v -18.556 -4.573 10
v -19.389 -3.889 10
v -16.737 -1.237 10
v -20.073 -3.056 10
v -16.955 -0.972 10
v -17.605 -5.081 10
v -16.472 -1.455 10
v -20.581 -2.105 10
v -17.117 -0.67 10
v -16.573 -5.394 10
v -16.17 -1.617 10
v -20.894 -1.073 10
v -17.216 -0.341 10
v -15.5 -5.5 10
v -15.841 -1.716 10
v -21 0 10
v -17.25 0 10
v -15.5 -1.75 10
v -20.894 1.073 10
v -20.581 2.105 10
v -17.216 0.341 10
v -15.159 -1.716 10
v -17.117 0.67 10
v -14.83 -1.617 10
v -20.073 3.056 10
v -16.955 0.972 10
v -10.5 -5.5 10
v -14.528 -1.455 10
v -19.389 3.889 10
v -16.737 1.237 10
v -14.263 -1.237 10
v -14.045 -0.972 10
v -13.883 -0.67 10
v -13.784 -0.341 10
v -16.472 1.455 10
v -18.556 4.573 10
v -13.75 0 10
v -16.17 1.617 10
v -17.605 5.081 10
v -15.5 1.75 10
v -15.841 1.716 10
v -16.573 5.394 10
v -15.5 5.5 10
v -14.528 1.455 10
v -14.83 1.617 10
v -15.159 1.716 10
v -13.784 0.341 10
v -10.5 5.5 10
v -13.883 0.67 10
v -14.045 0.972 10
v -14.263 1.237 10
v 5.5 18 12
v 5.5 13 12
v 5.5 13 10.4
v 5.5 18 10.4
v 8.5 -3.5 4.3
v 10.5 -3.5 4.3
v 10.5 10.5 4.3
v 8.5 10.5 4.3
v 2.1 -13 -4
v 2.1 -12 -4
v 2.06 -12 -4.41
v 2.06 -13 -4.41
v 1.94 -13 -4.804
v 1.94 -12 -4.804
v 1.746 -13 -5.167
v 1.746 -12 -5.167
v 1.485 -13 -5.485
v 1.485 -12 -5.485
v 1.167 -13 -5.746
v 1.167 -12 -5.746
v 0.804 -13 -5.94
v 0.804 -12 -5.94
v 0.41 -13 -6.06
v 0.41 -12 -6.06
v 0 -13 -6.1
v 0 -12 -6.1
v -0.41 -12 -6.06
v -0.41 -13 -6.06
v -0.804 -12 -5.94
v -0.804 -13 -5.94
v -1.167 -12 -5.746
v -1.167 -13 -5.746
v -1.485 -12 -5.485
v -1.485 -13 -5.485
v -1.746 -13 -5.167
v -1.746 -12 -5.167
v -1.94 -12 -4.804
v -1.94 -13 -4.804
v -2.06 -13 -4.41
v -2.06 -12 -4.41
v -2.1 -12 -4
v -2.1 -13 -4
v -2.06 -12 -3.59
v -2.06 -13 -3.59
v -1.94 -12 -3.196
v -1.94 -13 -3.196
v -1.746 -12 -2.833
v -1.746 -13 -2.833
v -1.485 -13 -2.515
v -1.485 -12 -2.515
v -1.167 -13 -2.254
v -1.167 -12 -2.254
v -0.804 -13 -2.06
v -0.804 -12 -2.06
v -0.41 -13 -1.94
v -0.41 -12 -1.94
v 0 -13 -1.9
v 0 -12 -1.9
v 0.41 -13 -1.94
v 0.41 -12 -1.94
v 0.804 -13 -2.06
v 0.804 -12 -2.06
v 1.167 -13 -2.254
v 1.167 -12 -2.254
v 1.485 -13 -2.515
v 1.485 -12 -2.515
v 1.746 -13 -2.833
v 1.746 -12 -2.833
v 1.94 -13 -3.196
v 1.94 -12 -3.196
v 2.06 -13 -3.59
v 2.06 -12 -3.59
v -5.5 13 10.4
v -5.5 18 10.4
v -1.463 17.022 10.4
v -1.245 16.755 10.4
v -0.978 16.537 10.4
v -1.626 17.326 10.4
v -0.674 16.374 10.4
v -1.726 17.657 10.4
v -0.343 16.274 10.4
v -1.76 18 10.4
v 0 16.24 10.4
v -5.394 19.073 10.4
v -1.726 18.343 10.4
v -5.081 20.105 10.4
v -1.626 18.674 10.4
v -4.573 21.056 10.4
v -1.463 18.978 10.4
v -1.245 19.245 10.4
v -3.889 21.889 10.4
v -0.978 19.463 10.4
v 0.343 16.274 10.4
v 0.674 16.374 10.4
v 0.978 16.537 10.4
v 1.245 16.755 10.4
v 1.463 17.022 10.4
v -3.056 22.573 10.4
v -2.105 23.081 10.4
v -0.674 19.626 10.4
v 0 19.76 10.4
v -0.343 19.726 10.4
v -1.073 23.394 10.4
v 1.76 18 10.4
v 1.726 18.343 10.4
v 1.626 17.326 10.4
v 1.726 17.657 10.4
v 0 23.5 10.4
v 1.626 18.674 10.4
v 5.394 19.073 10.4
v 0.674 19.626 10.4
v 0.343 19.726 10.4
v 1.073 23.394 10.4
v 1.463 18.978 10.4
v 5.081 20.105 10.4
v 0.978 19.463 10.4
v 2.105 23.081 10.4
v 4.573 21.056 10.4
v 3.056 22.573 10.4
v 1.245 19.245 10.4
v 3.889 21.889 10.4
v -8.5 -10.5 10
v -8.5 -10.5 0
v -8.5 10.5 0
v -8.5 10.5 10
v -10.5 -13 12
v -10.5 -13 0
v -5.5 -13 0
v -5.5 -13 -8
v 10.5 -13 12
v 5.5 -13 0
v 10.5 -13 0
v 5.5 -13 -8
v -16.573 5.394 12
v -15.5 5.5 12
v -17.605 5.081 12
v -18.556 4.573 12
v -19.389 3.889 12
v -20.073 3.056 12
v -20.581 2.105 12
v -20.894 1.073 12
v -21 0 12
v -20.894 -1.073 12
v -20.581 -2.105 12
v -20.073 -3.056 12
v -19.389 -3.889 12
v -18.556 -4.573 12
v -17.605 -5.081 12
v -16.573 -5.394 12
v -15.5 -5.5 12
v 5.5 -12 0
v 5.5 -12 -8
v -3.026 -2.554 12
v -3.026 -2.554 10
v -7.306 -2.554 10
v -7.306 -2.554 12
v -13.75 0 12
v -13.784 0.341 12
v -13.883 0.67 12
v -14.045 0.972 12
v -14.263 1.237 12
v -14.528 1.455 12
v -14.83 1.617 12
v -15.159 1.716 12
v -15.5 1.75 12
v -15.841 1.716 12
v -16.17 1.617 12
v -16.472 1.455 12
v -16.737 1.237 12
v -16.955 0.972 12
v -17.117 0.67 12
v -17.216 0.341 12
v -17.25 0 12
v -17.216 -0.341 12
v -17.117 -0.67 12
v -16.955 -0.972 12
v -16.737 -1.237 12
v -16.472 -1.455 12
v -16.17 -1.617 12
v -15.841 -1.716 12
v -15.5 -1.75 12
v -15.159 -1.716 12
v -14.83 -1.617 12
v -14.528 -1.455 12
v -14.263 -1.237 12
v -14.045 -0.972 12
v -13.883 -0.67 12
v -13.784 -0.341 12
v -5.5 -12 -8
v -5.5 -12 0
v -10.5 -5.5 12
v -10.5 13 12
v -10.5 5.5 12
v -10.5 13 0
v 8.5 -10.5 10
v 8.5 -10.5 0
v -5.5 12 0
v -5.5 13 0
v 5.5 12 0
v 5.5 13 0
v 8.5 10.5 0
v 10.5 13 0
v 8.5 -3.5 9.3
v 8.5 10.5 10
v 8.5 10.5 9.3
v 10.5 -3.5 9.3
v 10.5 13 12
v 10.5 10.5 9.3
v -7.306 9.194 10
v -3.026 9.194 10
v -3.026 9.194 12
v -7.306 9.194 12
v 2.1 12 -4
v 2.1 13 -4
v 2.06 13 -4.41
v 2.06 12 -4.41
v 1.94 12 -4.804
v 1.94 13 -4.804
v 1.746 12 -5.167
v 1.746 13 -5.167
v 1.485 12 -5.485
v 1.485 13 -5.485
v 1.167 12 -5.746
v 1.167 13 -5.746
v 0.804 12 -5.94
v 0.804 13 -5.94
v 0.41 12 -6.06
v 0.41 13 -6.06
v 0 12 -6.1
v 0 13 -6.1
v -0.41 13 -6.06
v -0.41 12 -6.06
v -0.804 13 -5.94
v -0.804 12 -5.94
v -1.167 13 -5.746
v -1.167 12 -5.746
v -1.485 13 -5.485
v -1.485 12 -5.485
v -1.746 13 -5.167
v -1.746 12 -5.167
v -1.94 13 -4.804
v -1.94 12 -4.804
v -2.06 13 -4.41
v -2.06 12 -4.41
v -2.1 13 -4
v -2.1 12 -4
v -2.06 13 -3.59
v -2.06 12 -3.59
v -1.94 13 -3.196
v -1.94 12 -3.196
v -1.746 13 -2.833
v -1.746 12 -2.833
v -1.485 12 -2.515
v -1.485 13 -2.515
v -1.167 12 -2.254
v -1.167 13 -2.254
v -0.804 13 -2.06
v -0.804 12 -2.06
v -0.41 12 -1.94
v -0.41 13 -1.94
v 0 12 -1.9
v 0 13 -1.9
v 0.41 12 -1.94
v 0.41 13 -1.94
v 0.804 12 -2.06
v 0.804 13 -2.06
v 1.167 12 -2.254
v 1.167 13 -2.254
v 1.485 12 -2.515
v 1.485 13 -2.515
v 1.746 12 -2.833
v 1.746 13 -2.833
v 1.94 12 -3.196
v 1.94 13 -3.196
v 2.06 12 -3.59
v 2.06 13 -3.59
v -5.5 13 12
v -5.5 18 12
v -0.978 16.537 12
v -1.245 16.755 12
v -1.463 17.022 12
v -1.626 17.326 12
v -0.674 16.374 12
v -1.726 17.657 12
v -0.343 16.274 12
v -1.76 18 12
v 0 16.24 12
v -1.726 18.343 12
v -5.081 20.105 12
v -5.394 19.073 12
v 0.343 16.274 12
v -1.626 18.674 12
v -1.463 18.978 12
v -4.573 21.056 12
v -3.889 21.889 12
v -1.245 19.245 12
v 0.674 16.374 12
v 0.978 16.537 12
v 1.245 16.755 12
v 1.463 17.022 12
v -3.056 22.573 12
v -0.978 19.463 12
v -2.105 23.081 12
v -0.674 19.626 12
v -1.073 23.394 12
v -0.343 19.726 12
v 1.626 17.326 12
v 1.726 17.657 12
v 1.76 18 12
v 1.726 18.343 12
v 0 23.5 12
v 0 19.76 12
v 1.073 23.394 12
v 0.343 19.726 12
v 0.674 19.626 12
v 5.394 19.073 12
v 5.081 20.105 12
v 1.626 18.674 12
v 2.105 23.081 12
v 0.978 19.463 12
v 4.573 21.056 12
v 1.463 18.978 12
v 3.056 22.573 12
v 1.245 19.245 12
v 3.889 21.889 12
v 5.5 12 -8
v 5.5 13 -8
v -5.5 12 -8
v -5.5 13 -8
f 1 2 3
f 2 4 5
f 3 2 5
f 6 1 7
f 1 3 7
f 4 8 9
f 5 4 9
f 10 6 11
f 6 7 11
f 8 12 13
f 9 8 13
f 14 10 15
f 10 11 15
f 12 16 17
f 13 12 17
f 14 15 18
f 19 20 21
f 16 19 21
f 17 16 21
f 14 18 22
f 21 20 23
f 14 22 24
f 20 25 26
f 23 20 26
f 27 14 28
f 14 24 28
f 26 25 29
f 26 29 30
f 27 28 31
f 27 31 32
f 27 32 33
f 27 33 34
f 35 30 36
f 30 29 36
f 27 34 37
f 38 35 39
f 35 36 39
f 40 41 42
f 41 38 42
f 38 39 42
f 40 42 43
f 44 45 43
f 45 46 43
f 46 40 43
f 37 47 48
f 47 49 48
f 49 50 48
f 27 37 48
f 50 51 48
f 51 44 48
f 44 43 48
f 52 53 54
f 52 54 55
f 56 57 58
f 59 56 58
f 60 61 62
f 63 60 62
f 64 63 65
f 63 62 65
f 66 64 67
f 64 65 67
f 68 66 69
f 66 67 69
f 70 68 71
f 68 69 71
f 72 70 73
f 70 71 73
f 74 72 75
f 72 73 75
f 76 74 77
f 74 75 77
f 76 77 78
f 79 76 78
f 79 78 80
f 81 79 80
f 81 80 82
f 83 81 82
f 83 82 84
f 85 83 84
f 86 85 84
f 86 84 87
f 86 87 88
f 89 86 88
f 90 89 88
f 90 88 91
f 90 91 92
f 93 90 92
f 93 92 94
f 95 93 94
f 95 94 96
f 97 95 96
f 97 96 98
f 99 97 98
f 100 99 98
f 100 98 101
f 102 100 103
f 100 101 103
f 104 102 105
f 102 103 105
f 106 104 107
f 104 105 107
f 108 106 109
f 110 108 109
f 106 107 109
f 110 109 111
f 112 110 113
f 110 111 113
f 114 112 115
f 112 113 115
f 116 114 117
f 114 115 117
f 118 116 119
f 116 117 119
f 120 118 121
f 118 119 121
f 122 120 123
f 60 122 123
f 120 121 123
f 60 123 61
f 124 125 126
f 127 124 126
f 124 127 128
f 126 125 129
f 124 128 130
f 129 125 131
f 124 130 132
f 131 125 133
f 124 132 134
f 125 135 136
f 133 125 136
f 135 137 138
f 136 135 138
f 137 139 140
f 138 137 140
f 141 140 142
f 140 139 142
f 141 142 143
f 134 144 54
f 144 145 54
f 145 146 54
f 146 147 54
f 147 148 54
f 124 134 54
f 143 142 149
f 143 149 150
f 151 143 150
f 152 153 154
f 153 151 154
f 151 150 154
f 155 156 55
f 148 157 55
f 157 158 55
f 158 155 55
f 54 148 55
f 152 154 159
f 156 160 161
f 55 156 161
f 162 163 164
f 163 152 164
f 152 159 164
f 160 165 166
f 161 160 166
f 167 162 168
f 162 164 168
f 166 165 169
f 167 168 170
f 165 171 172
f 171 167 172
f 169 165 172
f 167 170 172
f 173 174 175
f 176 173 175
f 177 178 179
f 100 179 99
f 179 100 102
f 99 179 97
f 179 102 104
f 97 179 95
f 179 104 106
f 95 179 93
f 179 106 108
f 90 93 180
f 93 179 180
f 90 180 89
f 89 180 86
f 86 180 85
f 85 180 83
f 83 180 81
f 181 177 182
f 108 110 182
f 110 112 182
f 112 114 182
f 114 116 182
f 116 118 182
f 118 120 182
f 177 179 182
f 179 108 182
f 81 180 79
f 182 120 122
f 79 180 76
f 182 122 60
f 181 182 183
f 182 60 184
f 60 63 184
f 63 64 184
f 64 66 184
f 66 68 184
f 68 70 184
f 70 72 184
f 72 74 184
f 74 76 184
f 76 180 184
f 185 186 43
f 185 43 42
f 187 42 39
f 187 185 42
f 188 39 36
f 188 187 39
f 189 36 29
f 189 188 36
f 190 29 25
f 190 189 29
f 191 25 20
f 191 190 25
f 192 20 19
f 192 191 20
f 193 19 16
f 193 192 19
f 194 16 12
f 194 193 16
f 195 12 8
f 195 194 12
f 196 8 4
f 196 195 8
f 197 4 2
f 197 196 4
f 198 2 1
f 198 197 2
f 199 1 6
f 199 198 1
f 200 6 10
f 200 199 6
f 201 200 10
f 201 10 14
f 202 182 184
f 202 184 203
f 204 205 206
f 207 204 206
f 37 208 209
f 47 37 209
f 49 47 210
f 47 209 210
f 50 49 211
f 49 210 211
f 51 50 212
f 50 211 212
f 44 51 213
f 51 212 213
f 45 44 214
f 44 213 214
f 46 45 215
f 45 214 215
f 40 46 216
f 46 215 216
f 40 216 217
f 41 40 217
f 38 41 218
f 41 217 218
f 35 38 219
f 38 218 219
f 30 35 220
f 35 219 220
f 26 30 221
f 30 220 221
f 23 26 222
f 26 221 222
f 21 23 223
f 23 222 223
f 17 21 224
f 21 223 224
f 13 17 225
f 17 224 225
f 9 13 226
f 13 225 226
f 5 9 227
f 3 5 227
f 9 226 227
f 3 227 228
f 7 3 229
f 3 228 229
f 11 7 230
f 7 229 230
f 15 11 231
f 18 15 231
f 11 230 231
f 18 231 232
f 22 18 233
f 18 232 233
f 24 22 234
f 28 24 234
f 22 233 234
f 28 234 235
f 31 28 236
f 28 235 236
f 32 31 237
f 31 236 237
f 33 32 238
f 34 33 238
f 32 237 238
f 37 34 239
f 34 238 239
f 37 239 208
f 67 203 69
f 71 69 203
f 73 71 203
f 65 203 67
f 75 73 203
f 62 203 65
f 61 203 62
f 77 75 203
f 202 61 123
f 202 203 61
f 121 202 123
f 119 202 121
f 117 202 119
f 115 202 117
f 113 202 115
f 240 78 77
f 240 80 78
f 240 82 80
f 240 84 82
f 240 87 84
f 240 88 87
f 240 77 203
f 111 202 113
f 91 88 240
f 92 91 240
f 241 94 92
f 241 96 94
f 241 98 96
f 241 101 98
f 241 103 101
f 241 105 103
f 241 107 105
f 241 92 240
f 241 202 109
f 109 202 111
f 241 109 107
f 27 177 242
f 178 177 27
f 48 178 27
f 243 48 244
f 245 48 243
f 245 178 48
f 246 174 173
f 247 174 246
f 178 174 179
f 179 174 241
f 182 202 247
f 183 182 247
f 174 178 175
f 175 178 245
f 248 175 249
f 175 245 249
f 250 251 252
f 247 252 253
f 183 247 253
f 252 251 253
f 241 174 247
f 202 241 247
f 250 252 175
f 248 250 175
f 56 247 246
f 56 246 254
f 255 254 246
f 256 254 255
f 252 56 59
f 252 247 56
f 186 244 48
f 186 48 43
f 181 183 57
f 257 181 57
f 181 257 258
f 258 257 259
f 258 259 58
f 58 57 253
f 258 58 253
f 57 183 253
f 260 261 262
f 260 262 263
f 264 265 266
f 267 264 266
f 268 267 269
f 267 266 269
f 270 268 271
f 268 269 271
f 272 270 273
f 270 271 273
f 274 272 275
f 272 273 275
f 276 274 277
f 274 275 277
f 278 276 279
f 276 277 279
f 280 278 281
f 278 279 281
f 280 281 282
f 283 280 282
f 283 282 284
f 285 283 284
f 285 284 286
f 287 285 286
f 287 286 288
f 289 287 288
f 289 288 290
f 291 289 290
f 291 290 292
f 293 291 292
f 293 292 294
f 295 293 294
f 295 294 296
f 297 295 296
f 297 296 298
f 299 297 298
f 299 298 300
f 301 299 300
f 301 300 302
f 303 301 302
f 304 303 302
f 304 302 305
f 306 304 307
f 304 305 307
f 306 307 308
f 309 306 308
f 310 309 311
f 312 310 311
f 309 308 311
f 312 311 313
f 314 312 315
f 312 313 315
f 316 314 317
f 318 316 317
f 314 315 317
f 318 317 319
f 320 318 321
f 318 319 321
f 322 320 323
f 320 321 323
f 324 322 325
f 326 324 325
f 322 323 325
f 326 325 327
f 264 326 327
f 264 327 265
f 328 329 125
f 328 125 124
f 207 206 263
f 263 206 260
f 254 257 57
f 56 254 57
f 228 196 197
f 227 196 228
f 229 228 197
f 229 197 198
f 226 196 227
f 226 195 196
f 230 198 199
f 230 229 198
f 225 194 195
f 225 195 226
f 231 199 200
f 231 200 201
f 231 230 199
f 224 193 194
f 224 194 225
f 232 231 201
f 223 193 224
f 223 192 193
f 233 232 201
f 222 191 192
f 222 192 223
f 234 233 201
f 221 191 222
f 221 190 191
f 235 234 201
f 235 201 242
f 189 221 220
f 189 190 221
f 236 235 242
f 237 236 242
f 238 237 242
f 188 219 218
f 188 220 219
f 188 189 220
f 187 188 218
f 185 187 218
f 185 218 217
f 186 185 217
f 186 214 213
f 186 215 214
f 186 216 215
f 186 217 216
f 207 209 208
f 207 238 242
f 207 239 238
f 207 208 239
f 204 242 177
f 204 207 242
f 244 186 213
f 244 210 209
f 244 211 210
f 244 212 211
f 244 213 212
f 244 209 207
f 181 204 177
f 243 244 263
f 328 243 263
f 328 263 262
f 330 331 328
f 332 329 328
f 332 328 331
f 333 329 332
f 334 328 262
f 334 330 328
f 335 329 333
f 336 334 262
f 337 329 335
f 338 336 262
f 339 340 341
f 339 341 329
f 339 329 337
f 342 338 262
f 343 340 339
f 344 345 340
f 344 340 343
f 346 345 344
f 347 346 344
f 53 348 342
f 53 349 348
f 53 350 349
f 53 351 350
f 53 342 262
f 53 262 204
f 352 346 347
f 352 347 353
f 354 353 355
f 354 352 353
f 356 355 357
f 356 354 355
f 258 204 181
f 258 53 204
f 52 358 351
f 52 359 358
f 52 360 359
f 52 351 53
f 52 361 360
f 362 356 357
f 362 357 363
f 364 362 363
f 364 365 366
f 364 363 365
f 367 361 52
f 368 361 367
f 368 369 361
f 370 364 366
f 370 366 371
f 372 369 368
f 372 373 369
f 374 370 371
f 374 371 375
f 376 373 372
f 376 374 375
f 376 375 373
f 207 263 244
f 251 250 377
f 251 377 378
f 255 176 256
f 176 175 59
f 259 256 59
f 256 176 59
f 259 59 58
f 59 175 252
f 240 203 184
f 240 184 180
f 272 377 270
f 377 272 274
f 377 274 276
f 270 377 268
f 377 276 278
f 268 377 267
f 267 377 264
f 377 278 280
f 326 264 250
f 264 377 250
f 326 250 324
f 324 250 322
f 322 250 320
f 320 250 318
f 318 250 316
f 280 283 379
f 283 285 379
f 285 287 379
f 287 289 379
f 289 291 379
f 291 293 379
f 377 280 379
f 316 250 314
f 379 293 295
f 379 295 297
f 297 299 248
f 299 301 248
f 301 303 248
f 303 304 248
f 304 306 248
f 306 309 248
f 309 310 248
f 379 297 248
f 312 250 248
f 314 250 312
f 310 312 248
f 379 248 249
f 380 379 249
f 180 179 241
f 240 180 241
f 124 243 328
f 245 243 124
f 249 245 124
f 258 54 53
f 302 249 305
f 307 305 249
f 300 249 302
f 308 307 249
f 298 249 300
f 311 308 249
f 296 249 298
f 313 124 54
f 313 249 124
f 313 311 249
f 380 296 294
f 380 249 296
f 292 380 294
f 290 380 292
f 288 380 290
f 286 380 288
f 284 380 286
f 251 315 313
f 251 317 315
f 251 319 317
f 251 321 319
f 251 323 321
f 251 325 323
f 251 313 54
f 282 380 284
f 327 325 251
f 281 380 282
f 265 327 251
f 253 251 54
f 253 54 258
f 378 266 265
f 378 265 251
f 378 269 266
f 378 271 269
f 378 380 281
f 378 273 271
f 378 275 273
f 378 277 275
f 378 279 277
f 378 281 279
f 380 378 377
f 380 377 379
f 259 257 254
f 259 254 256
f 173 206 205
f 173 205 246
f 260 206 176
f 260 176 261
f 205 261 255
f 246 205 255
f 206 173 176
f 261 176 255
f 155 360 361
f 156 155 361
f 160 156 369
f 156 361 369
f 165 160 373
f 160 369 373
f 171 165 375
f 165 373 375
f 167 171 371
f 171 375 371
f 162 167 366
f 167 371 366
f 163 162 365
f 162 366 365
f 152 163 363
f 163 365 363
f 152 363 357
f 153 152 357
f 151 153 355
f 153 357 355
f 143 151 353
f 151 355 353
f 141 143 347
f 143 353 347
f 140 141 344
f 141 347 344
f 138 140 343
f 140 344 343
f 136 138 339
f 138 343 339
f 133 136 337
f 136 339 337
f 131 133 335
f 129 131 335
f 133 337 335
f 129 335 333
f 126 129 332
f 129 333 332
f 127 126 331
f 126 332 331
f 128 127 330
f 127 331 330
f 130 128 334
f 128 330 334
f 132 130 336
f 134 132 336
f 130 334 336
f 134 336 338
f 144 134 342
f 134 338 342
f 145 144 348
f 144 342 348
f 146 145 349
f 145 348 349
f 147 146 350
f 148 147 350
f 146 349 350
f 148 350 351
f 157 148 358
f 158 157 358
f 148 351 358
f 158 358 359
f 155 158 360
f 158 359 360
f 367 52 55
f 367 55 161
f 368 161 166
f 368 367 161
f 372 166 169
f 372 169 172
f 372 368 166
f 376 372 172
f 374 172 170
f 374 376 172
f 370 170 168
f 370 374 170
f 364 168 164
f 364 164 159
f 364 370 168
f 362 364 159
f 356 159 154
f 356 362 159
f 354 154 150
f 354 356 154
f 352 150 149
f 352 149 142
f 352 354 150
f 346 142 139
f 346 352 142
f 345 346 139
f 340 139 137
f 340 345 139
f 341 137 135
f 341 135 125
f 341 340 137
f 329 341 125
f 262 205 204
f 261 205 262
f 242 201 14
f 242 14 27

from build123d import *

# Parameters (mm, degrees)
SKETCH1_W           = 21
SKETCH1_H           = 26
SKETCH1_W_2         = 17
SKETCH1_H_2         = 21
BOSS_EXTRUDE1_DEPTH = 10
SKETCH2_W           = 21
SKETCH2_H           = 26
BOSS_EXTRUDE2_DEPTH = 2
SKETCH4_W           = 5
SKETCH4_H           = 14
CUT_EXTRUDE2_DEPTH  = 2
SKETCH6_R           = 1.76
BOSS_EXTRUDE3_DEPTH = 1.6
SKETCH9_R           = 1.76
BOSS_EXTRUDE5_DEPTH = 2
SKETCH14_W          = 11
SKETCH14_H          = 1
BOSS_EXTRUDE8_DEPTH = 8
SKETCH16_R          = 2.1
CUT_EXTRUDE3_DEPTH  = 39
CUT_EXTRUDE4_DEPTH  = 10
SKETCH18_R          = 1.75
BOSS_EXTRUDE9_DEPTH = 2
SKETCH19_W          = 4.280254221
SKETCH19_H          = 11.747931796
CUT_EXTRUDE5_DEPTH  = 10


with BuildPart() as part:
    # Sketch1 → Boss-Extrude1 (new body)
    with BuildSketch(Plane.XY):
        Rectangle(SKETCH1_W, SKETCH1_H)
        Rectangle(SKETCH1_W_2, SKETCH1_H_2, mode=Mode.SUBTRACT)
    extrude(amount=BOSS_EXTRUDE1_DEPTH)

    # Sketch2 → Boss-Extrude2 (add)
    with BuildSketch(Plane.XY.offset(10)):
        Rectangle(SKETCH2_W, SKETCH2_H)
    extrude(amount=BOSS_EXTRUDE2_DEPTH)

    # Sketch4 → Cut-Extrude2 (cut)
    with BuildSketch(Plane(origin=(10.5, 0, 0), x_dir=(0, 0, -1), z_dir=(1, 0, 0))):
        with Locations((-6.8, 3.5)):
            Rectangle(SKETCH4_W, SKETCH4_H)
    extrude(amount=-CUT_EXTRUDE2_DEPTH, mode=Mode.SUBTRACT)

    # Sketch6 → Boss-Extrude3 (add)
    with BuildSketch(Plane.XY.offset(12)):
        with BuildLine():
            Line((0, 13), (5.5, 13))
            Line((5.5, 13), (5.5, 18))
            ThreePointArc((5.5, 18), (0, 23.5), (-5.5, 18))
            Line((-5.5, 18), (-5.5, 13))
            Line((-5.5, 13), (0, 13))
        make_face()
        with Locations((0, 18)):
            Circle(SKETCH6_R, mode=Mode.SUBTRACT)
    extrude(amount=-BOSS_EXTRUDE3_DEPTH)

    # Sketch9 → Boss-Extrude5 (add)
    with BuildSketch(Plane.XY.offset(12)):
        with BuildLine():
            Line((0, -13), (-5.5, -13))
            Line((-5.5, -13), (-5.5, -18))
            ThreePointArc((-5.5, -18), (0, -23.5), (5.5, -18))
            Line((5.5, -18), (5.5, -13))
            Line((5.5, -13), (0, -13))
        make_face()
        with Locations((0, -18)):
            Circle(SKETCH9_R, mode=Mode.SUBTRACT)
    extrude(amount=-BOSS_EXTRUDE5_DEPTH)

    # Sketch14 → Boss-Extrude8 (add)
    with BuildSketch(Plane(origin=(0, 0, 0), x_dir=(-1, 0, 0), z_dir=(0, 0, -1))):
        with Locations((0, -12.5)):
            Rectangle(SKETCH14_W, SKETCH14_H)
        with Locations((0, 12.5)):
            Rectangle(SKETCH14_W, SKETCH14_H)
    extrude(amount=BOSS_EXTRUDE8_DEPTH)

    # Sketch16 → Cut-Extrude3 (cut)
    with BuildSketch(Plane(origin=(0, 13, 0), x_dir=(1, 0, 0), z_dir=(0, 1, 0))):
        with Locations((0, 4)):
            Circle(SKETCH16_R)
    extrude(amount=-CUT_EXTRUDE3_DEPTH, mode=Mode.SUBTRACT)

    # Sketch17 → Cut-Extrude4 (cut)
    with BuildSketch(Plane(origin=(0, 0, 10), x_dir=(-1, 0, 0), z_dir=(0, 0, -1))):
        with BuildLine():
            Line((-5.5, -18), (-5.5, -13))
            Line((-5.5, -13), (5.5, -13))
            Line((5.5, -13), (5.5, -18))
            ThreePointArc((5.5, -18), (0, -23.5), (-5.5, -18))
        make_face()
    extrude(amount=-CUT_EXTRUDE4_DEPTH, mode=Mode.SUBTRACT)

    # Sketch18 → Boss-Extrude9 (add)
    with BuildSketch(Plane.XY.offset(12)):
        with BuildLine():
            Line((-10.5, 0), (-10.5, 5.5))
            Line((-10.5, 5.5), (-15.5, 5.5))
            ThreePointArc((-15.5, 5.5), (-21, 0), (-15.5, -5.5))
            Line((-15.5, -5.5), (-10.5, -5.5))
            Line((-10.5, -5.5), (-10.5, 0))
        make_face()
        with Locations((-15.5, 0)):
            Circle(SKETCH18_R, mode=Mode.SUBTRACT)
    extrude(amount=-BOSS_EXTRUDE9_DEPTH)

    # Sketch19 → Cut-Extrude5 (cut)
    with BuildSketch(Plane(origin=(0, 0, 10), x_dir=(-1, 0, 0), z_dir=(0, 0, -1))):
        with Locations((5.165781479, 3.32004636)):
            Rectangle(SKETCH19_W, SKETCH19_H)
    extrude(amount=-CUT_EXTRUDE5_DEPTH, mode=Mode.SUBTRACT)


solid = part.part
